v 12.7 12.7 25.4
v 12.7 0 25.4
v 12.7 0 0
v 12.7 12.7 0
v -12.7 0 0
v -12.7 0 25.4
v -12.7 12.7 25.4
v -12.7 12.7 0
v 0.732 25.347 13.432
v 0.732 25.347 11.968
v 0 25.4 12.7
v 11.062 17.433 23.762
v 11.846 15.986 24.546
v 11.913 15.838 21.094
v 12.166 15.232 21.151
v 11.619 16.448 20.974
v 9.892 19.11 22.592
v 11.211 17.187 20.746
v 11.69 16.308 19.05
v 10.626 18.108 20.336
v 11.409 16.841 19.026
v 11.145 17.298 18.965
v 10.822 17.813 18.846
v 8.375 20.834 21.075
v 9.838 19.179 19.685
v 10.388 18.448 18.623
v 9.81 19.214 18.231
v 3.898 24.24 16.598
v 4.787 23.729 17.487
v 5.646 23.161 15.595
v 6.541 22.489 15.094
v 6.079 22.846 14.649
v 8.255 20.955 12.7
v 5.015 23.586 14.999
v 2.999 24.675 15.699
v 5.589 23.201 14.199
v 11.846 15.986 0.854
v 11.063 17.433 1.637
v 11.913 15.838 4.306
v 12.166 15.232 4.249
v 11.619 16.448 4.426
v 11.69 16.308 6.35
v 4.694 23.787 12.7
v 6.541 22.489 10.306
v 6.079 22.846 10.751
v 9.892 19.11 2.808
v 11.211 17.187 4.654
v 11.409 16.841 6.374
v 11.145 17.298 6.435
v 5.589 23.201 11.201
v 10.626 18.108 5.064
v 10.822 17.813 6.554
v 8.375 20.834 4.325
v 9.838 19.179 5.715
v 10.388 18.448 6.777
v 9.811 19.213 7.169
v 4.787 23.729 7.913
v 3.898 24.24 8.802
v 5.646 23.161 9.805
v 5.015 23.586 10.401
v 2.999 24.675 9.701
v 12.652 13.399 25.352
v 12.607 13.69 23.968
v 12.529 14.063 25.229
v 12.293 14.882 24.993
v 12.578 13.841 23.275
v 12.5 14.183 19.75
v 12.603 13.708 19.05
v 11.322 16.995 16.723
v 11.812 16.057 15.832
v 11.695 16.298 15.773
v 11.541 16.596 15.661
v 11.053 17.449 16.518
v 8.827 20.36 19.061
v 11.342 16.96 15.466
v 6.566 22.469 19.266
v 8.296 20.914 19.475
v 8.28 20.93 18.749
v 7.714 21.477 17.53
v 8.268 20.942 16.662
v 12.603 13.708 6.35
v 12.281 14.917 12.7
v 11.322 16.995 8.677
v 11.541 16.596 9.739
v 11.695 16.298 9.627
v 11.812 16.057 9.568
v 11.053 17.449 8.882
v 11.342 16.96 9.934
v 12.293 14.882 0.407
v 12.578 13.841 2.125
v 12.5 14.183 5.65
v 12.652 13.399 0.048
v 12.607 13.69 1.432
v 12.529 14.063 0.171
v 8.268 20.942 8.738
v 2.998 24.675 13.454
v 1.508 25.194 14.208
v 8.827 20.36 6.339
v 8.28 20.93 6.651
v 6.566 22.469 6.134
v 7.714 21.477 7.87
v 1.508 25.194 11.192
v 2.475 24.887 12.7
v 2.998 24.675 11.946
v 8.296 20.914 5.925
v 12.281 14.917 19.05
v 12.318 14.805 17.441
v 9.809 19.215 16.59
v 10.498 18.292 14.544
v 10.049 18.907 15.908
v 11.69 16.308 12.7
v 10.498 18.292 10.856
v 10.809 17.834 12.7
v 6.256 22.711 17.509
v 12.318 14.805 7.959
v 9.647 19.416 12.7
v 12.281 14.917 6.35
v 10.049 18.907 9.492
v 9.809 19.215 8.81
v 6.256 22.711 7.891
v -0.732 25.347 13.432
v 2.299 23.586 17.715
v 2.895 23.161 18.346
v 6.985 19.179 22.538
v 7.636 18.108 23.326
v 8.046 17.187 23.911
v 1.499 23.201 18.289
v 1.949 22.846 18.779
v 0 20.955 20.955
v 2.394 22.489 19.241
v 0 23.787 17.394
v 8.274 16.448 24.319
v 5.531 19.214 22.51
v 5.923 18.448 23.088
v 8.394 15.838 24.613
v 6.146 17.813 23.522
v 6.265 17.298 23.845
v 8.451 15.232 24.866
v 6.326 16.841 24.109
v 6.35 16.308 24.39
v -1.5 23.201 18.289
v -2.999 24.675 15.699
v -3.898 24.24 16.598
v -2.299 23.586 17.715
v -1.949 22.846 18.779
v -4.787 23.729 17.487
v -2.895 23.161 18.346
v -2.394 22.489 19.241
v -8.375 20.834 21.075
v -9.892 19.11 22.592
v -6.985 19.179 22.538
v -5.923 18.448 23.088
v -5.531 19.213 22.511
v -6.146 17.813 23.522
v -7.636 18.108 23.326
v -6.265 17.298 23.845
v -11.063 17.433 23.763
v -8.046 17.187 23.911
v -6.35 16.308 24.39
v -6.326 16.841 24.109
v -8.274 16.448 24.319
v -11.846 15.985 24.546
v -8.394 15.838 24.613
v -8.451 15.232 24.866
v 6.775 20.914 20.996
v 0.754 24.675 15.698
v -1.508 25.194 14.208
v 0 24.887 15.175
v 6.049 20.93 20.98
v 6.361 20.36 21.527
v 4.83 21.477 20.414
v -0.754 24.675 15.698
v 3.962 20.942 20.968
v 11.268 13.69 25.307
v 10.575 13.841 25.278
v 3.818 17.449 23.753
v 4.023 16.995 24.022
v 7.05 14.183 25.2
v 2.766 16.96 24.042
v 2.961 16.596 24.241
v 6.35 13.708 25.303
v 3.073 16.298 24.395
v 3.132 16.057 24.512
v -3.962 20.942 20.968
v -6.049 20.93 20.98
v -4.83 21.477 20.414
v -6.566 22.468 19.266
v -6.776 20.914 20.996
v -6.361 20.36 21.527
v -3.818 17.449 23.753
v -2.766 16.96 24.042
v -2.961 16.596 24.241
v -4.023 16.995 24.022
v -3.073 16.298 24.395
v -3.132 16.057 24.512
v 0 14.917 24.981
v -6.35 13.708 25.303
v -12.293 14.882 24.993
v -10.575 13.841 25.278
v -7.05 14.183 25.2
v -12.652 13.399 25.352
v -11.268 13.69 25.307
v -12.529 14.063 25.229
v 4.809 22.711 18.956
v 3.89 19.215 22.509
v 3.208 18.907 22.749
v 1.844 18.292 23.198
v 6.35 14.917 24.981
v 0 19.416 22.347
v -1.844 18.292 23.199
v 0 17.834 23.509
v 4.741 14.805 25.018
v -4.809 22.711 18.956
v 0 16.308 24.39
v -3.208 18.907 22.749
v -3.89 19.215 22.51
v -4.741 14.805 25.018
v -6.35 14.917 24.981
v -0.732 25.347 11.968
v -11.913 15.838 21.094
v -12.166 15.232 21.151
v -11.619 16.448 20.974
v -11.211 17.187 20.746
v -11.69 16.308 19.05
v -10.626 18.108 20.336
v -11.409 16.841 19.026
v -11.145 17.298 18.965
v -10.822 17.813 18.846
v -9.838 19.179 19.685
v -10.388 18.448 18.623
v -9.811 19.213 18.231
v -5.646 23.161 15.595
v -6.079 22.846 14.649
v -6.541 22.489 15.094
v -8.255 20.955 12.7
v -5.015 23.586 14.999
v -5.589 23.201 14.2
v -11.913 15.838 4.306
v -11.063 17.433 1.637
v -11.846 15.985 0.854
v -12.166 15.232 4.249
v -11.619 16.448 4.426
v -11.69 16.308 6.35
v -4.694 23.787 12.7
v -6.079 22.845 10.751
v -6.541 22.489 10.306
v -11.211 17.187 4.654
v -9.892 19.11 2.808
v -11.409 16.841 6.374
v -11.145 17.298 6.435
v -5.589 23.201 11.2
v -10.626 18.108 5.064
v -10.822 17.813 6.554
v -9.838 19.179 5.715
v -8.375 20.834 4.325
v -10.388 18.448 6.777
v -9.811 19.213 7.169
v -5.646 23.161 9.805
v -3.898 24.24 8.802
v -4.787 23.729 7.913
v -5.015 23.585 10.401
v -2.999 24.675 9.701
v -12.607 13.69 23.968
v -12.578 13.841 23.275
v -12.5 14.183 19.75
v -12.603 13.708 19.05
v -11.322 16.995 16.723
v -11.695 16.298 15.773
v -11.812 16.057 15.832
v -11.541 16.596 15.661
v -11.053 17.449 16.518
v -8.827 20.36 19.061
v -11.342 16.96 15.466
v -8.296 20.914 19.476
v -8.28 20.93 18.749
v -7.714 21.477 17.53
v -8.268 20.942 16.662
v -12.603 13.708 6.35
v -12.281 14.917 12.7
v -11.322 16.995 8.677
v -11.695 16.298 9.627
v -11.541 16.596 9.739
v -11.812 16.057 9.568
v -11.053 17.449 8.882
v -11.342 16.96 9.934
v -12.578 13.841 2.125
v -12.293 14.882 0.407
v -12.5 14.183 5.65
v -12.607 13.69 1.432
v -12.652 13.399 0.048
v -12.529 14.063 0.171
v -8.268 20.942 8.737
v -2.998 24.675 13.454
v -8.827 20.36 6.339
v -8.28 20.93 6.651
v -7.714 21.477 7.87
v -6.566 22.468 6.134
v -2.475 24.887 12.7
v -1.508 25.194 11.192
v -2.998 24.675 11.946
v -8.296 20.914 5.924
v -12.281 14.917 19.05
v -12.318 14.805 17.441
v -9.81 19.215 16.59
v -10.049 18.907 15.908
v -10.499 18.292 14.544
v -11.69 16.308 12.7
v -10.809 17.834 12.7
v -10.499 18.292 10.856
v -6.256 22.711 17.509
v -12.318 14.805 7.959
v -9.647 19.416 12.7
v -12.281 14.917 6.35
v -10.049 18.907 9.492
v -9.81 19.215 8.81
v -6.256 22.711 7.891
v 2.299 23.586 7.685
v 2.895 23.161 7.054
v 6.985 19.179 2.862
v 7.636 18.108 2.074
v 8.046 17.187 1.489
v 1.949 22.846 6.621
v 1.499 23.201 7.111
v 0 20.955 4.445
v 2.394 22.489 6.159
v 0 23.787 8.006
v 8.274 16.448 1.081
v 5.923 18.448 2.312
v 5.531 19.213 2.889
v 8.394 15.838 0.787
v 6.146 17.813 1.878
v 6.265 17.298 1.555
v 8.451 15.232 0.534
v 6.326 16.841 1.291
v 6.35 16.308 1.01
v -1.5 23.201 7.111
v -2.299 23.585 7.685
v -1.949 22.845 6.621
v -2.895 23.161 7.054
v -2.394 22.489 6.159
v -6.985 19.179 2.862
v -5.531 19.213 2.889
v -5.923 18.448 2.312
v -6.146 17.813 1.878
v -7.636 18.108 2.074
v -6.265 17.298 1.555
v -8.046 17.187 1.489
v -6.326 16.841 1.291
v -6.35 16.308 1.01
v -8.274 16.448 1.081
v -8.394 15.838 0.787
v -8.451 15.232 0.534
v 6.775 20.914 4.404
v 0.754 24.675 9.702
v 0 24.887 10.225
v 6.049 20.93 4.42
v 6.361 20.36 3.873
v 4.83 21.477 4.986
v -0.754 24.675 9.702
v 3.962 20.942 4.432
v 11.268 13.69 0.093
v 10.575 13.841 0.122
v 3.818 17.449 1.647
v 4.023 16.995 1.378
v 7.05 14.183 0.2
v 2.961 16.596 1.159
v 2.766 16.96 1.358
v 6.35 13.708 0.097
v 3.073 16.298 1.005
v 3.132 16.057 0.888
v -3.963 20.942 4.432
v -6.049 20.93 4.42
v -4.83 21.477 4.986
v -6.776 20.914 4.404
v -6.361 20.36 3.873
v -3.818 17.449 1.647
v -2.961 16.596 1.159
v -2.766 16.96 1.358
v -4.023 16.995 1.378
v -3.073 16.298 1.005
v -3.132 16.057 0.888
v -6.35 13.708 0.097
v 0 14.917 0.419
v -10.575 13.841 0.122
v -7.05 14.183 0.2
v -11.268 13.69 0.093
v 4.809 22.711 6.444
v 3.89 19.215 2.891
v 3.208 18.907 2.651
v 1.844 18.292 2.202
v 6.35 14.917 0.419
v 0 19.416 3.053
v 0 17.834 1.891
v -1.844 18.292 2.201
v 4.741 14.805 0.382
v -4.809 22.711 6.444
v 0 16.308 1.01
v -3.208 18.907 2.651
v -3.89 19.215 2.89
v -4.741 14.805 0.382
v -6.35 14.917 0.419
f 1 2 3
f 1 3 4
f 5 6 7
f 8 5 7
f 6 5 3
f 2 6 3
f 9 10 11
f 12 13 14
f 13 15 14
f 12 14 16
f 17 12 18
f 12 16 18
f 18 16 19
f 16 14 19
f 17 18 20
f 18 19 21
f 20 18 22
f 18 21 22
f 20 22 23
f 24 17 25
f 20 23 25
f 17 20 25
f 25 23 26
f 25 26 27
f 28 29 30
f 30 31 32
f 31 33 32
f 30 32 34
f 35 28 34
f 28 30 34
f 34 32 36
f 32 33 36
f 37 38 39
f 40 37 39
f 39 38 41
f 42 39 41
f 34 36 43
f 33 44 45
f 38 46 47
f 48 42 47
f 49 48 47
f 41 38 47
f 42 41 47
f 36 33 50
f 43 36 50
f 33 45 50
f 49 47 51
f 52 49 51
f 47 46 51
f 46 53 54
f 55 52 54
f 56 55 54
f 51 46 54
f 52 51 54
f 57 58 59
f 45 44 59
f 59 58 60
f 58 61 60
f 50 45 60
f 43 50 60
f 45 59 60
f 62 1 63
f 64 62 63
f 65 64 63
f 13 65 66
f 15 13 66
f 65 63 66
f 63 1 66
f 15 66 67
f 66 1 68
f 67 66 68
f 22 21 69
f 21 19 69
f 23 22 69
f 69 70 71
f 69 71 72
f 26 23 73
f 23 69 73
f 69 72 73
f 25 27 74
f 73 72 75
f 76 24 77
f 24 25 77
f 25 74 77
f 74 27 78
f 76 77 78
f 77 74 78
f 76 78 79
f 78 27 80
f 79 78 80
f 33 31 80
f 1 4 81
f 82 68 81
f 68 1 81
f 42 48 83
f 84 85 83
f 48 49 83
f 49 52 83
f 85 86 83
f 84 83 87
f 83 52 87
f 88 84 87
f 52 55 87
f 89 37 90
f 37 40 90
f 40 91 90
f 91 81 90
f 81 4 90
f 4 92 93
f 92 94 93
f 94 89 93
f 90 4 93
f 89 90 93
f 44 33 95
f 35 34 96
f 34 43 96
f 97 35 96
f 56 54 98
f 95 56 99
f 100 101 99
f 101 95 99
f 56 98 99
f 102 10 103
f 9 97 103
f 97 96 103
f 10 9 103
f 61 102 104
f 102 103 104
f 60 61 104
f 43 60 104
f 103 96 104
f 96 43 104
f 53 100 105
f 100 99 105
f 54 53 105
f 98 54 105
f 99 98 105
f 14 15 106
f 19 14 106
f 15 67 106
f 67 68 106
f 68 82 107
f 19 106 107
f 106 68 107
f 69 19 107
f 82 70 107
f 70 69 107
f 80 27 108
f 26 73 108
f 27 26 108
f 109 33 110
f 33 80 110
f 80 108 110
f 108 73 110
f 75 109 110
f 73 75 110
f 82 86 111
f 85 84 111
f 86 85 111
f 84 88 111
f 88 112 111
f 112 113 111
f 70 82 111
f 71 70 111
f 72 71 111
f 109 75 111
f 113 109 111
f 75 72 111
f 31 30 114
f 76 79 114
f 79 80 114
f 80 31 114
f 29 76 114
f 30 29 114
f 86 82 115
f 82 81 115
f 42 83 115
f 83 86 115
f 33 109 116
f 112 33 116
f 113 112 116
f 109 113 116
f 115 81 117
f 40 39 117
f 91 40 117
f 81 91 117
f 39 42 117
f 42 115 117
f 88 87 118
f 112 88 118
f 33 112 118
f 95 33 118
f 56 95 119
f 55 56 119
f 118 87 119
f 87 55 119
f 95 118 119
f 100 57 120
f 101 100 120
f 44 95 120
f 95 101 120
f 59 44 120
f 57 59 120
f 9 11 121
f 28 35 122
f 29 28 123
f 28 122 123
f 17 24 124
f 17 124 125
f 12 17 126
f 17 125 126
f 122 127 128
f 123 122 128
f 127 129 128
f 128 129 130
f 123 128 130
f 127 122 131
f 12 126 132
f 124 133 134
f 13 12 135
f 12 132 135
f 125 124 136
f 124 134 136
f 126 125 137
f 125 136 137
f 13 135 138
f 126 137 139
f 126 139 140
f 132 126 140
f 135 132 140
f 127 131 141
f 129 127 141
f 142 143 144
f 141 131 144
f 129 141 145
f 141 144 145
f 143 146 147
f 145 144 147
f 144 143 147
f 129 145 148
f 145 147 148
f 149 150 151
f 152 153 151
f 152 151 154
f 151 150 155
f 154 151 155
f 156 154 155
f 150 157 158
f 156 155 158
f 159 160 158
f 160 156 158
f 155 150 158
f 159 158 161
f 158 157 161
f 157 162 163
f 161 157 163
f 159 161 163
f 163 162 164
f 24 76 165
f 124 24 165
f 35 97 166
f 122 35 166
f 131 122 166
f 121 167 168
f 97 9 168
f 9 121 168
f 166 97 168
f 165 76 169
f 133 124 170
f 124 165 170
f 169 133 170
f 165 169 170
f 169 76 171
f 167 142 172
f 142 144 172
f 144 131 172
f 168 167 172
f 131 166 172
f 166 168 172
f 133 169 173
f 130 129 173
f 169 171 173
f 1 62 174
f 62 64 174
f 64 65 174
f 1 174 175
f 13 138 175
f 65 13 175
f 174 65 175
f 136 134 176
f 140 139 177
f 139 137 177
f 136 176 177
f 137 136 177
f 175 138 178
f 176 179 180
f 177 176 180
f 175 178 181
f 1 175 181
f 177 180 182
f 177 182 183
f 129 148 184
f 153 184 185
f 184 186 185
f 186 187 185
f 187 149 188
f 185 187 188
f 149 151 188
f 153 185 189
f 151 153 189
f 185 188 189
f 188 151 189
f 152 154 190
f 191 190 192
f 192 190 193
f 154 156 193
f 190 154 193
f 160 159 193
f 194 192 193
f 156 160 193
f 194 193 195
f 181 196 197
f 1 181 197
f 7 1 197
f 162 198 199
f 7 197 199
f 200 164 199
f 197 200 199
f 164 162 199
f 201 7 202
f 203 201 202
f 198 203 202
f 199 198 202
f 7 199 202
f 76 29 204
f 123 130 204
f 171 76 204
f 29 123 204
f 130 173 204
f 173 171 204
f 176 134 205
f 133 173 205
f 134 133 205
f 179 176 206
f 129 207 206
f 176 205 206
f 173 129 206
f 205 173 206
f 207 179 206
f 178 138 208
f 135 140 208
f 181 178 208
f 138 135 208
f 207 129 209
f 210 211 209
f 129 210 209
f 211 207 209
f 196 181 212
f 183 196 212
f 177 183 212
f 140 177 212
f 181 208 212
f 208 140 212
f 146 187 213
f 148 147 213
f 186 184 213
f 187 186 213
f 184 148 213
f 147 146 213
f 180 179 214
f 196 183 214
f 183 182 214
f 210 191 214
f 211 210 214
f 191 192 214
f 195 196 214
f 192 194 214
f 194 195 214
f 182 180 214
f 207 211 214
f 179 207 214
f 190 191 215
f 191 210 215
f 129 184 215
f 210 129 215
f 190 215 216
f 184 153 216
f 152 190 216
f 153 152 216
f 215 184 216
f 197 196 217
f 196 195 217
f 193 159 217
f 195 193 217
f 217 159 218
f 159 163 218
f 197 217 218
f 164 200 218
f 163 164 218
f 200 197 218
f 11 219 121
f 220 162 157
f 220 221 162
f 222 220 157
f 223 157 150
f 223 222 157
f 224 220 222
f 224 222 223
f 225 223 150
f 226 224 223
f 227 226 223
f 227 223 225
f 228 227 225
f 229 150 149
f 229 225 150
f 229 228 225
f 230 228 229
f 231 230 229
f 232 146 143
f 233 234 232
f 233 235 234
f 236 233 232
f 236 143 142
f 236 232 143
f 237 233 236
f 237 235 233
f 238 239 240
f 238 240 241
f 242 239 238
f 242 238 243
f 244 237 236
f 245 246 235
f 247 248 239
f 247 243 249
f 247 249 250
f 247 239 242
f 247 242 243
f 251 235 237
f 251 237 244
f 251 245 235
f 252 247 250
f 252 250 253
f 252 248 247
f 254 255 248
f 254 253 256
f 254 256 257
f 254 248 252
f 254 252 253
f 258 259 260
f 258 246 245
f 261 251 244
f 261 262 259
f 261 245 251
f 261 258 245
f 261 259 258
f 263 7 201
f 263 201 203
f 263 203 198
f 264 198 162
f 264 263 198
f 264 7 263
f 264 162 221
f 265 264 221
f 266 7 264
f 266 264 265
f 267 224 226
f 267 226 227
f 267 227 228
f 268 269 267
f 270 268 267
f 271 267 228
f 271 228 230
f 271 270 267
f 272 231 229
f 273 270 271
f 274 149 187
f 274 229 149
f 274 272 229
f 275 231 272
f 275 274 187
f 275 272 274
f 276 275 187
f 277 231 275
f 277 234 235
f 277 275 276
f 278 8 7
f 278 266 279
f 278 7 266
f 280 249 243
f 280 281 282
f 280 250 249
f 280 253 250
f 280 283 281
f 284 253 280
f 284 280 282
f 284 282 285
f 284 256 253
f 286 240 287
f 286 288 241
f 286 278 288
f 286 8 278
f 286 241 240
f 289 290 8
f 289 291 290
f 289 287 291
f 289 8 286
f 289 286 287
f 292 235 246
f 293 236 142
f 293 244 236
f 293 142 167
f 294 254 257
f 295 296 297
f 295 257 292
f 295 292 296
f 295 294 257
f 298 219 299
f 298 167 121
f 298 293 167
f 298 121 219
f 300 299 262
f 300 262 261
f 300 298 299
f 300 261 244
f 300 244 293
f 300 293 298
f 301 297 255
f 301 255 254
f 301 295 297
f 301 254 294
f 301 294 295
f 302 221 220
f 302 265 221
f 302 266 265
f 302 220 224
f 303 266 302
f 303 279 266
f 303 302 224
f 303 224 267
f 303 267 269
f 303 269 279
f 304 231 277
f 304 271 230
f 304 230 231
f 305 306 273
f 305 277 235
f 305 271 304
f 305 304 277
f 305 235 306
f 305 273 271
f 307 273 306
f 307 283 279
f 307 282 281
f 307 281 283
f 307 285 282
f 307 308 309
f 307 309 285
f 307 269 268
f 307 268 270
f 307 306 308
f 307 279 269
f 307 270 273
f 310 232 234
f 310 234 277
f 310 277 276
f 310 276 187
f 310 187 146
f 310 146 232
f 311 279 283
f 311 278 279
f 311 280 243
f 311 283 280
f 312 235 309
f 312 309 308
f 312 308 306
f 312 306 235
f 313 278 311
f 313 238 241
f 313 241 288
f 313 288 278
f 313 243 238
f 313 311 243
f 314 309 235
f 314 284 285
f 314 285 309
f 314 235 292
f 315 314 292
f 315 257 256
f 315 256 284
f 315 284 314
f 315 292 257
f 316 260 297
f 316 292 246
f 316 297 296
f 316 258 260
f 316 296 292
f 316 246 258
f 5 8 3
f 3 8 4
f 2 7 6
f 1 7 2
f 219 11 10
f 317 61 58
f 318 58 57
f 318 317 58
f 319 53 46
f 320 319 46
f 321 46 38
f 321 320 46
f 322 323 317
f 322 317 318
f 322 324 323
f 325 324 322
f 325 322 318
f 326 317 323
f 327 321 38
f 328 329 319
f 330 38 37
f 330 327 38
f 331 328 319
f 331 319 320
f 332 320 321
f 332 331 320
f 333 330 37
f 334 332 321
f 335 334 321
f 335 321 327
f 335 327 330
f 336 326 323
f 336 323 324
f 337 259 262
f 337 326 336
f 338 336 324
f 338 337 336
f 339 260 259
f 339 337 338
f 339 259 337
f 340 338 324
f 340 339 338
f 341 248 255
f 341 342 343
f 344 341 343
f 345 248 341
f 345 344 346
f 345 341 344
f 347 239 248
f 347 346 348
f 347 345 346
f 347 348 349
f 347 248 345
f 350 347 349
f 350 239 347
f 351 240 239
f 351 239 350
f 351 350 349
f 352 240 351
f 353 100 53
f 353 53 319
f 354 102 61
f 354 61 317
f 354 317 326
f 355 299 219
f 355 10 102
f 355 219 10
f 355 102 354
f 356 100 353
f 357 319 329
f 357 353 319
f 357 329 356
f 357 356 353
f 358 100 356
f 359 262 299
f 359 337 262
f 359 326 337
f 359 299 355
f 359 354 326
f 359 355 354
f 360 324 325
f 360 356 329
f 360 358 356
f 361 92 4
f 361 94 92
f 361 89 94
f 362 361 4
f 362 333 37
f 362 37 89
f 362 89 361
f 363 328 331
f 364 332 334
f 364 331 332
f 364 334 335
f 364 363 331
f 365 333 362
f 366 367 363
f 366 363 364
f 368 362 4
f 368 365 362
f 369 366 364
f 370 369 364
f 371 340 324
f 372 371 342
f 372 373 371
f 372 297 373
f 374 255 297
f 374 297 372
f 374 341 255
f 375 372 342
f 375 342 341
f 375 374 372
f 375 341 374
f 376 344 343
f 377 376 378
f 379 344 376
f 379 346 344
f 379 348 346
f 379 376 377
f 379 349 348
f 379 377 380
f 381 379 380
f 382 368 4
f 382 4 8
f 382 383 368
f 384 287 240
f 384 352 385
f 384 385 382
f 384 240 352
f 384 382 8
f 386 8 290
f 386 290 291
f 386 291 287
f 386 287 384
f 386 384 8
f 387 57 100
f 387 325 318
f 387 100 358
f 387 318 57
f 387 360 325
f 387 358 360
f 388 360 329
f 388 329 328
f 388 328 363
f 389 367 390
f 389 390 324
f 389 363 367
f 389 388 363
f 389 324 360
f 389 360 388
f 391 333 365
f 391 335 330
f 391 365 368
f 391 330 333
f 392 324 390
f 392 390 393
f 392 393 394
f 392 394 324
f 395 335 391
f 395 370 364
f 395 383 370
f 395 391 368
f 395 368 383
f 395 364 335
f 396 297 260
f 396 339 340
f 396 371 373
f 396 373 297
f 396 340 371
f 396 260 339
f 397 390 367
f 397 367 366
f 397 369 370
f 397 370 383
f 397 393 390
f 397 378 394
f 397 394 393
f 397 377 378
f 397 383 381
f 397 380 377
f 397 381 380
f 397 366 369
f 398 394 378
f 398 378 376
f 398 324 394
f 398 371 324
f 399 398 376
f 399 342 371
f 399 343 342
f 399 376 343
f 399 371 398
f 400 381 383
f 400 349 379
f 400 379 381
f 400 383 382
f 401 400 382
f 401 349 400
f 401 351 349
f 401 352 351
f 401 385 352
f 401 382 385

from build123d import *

# Parameters (mm, degrees)
F0_W        = 12.7
F0_H        = 25.4
F1_DEPTH    = 25.4
F2_T1_DEPTH = 88.9
F2_T3_DEPTH = 88.9


# Not quite as in the source:
# - a fillet or chamfer that OpenCascade refuses, or shapes differently, is made with other operations: its cross-section is extruded or revolved along the edge and cut away or added


with BuildPart() as f1:
    # F0 (on Top) → F1 (new body)
    with BuildSketch(Plane.XY):
        with Locations((-6.35, 12.7)):
            Rectangle(F0_W, F0_H)
        with Locations((6.35, 12.7)):
            Rectangle(F0_W, F0_H)
    extrude(amount=F1_DEPTH)

    # F2: fillet of radius 12.7 on 4 edges, made by hand

    # F2_s2 → F2_t1 (cut)
    with BuildSketch(Plane.XY.offset(-31.75)):
        with BuildLine():
            add(Edge.make_bspline(
                [(12.7, 12.7), (12.7, 25.4), (0, 25.4)],
                knots=[0, 0, 0, 1, 1, 1], degree=2, weights=[1, 0.4285714286, 1]))
            Line((0, 25.4), (12.7, 25.4))
            Line((12.7, 25.4), (12.7, 12.7))
        make_face()
        with BuildLine():
            add(Edge.make_bspline(
                [(-12.7, 12.7), (-12.7, 25.4), (0, 25.4)],
                knots=[0, 0, 0, 1, 1, 1], degree=2, weights=[1, 0.4285714286, 1]))
            Line((0, 25.4), (-12.7, 25.4))
            Line((-12.7, 25.4), (-12.7, 12.7))
        make_face()
    extrude(amount=F2_T1_DEPTH, mode=Mode.SUBTRACT)

    # F2_s4 → F2_t3 (cut)
    with BuildSketch(Plane.YZ.offset(-44.45)):
        with BuildLine():
            add(Edge.make_bspline(
                [(25.4, 12.7), (25.4, 0), (12.7, 0)],
                knots=[0, 0, 0, 1, 1, 1], degree=2, weights=[1, 0.4285714286, 1]))
            Line((12.7, 0), (25.4, 0))
            Line((25.4, 0), (25.4, 12.7))
        make_face()
        with BuildLine():
            add(Edge.make_bspline(
                [(25.4, 12.7), (25.4, 25.4), (12.7, 25.4)],
                knots=[0, 0, 0, 1, 1, 1], degree=2, weights=[1, 0.4285714286, 1]))
            Line((12.7, 25.4), (25.4, 25.4))
            Line((25.4, 25.4), (25.4, 12.7))
        make_face()
    extrude(amount=F2_T3_DEPTH, mode=Mode.SUBTRACT)


solid = f1.part
